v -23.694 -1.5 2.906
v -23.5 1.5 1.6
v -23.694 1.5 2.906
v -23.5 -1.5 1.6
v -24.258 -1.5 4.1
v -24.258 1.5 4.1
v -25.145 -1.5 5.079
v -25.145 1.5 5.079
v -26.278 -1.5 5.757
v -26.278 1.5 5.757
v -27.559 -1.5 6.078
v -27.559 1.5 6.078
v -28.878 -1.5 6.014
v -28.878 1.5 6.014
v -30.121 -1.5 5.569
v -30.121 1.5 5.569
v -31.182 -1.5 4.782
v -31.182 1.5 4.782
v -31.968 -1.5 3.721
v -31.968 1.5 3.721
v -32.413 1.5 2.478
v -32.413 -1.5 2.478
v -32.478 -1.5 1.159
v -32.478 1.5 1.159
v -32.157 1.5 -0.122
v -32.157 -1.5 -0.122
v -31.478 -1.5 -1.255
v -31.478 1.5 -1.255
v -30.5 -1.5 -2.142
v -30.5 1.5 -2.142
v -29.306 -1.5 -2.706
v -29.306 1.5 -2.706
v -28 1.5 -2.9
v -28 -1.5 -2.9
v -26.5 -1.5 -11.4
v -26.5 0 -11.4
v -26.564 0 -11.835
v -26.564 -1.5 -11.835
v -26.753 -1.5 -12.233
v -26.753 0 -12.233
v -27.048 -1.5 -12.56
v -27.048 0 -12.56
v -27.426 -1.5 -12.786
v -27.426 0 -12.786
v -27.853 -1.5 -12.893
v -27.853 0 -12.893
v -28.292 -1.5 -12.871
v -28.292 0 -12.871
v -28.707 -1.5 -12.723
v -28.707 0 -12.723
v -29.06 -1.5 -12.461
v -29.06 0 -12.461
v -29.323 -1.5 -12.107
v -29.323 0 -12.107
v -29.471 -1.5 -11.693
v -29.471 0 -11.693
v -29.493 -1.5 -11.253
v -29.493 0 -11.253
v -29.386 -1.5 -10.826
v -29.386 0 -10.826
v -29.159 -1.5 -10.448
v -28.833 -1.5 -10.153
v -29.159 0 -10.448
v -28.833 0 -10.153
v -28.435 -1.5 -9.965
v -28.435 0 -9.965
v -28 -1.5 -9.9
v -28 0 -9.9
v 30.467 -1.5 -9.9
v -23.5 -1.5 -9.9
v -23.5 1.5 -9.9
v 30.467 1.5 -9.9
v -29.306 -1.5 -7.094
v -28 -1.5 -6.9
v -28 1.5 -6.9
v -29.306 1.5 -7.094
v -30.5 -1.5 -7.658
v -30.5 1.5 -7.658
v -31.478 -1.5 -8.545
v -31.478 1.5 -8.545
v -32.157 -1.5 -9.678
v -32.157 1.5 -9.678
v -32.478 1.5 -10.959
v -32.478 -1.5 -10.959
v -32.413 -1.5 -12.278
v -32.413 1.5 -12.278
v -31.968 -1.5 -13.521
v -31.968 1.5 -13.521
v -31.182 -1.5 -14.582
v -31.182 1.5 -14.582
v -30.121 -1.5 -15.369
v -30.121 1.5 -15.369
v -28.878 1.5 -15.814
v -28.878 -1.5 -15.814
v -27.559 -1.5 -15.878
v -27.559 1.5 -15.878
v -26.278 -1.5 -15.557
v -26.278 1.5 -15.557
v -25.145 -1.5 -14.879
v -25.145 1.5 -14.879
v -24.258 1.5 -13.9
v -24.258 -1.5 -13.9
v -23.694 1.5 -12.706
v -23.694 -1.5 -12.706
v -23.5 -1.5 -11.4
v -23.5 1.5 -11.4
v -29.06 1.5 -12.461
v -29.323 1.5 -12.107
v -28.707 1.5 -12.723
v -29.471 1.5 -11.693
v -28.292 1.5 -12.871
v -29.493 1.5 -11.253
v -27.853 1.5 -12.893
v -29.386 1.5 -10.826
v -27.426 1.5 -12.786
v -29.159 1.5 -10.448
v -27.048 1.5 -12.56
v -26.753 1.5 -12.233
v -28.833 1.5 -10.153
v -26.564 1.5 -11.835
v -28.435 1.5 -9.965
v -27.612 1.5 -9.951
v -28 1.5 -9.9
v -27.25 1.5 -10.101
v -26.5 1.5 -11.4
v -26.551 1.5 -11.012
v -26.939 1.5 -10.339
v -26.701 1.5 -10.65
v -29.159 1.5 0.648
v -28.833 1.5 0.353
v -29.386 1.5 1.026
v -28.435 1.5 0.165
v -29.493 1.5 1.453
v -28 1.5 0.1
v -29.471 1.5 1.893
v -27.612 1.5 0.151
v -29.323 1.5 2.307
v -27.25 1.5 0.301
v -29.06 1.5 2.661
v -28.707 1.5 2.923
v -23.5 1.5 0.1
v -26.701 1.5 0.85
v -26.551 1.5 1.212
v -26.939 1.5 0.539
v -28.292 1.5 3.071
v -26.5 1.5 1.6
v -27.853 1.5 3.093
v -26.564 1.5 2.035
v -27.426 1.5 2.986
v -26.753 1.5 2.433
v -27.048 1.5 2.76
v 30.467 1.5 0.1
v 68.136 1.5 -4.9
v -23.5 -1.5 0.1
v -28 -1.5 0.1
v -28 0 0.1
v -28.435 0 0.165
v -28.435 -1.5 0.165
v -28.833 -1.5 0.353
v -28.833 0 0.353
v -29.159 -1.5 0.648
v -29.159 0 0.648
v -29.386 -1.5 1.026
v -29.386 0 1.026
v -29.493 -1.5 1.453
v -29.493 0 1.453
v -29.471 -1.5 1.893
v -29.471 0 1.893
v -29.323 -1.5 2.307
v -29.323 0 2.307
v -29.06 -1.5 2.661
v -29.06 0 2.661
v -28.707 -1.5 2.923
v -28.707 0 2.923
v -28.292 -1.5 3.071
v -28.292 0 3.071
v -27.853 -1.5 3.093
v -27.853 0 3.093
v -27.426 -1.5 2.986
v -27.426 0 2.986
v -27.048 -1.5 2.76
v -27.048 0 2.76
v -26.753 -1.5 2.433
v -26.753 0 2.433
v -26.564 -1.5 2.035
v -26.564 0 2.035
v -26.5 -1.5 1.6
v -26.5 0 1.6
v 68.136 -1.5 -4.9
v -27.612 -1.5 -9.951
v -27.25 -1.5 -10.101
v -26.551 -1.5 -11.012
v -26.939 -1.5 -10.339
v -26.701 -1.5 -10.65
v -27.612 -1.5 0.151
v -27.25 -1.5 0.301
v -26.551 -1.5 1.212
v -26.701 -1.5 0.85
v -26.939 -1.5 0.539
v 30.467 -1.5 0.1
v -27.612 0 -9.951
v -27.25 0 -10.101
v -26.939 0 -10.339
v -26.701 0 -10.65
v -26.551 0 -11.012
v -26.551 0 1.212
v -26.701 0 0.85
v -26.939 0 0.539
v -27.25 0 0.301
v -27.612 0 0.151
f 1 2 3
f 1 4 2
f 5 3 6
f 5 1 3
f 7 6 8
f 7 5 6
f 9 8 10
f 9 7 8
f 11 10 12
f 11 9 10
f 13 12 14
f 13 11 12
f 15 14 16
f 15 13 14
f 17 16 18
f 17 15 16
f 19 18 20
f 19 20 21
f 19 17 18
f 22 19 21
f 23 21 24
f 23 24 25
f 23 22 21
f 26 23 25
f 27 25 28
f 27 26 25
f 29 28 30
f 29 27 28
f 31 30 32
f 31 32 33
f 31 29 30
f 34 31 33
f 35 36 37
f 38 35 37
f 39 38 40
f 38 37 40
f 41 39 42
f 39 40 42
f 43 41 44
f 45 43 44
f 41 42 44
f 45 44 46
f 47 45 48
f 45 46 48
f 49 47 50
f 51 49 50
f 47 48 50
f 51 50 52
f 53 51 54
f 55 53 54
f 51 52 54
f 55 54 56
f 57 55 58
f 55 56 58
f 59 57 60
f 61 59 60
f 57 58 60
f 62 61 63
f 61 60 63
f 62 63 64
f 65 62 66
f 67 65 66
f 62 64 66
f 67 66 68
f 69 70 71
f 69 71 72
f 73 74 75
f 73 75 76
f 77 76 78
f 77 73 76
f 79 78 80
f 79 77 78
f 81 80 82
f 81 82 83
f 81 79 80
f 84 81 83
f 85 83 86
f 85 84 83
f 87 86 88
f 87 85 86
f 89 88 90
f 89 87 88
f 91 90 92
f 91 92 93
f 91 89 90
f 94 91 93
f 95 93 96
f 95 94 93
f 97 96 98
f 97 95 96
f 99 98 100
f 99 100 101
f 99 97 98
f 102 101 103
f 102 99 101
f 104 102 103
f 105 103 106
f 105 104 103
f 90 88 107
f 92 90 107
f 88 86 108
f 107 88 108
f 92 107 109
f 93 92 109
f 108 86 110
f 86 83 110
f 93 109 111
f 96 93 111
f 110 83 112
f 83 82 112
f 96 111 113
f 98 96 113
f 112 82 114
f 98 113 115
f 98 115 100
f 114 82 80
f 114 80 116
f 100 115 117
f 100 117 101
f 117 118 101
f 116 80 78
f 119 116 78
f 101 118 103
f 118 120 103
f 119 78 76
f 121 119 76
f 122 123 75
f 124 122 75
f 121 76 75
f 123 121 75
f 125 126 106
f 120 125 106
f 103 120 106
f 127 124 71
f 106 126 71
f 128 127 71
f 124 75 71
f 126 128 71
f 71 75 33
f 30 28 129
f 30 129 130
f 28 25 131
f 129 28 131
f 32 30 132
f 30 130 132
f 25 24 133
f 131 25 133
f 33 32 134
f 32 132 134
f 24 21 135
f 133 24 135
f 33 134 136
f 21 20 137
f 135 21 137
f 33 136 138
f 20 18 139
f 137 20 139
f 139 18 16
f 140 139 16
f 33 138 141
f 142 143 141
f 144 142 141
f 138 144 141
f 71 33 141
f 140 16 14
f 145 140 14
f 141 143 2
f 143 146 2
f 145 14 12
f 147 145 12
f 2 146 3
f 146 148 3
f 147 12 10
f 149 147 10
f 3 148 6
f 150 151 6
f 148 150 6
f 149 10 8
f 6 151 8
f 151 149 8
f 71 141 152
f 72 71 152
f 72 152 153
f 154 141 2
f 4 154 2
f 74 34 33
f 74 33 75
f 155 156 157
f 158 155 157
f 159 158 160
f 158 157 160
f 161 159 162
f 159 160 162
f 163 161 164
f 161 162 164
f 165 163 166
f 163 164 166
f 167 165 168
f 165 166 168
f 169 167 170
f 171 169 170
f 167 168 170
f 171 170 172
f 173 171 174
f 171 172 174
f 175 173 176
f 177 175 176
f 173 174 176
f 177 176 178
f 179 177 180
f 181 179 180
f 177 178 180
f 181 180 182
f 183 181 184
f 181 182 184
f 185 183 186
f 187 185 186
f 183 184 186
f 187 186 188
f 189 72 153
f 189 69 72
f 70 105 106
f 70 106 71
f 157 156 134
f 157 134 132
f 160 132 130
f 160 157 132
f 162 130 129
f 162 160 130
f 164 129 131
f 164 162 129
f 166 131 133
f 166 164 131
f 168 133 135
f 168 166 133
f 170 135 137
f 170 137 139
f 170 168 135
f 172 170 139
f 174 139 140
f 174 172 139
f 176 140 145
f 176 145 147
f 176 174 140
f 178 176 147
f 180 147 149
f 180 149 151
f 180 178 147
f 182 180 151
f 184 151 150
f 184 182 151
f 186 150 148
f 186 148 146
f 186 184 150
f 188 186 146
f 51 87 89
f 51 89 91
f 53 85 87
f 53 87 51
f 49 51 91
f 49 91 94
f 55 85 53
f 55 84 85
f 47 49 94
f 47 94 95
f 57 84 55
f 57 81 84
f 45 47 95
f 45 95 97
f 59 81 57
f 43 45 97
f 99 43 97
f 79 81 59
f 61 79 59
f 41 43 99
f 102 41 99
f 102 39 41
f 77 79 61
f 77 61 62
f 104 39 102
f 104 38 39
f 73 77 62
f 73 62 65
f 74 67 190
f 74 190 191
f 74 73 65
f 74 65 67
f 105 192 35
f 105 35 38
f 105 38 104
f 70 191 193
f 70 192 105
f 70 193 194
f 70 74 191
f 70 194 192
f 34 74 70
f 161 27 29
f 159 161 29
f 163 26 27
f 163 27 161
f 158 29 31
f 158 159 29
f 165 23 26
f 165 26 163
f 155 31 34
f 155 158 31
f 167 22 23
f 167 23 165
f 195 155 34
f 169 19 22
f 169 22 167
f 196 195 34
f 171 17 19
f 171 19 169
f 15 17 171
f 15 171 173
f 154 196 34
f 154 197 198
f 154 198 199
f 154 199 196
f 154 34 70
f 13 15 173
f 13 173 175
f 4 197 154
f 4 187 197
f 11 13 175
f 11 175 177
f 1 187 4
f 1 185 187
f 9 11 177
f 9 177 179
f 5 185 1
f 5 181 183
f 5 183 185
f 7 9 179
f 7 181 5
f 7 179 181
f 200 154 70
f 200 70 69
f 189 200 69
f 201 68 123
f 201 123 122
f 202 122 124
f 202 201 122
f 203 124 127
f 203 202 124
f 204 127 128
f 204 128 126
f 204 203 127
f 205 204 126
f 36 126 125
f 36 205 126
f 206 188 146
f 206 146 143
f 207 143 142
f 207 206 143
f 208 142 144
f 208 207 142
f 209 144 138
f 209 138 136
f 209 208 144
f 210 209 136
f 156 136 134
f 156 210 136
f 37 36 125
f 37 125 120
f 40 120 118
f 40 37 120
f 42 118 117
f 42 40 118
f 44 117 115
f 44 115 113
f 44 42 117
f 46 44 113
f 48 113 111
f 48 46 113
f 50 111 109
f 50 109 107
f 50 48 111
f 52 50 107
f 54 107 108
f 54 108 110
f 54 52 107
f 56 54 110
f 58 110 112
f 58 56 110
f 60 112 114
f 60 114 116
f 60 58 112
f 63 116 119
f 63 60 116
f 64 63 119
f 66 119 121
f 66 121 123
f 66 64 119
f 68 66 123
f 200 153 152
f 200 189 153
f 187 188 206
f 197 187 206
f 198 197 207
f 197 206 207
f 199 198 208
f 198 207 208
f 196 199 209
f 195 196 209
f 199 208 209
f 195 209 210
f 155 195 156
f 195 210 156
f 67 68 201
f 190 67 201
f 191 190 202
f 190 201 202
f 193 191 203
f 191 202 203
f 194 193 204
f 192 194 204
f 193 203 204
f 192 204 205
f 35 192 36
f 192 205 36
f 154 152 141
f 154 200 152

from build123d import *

# Parameters (mm, degrees)
F1_DEPTH = 1.5


with BuildPart() as f1:
    # F0 (on Front) → F1 (new body, symmetric)
    with BuildSketch(Plane.XZ):
        with BuildLine():
            ThreePointArc((-23.4997773468, 1.5999988765), (-31.1817578622, 4.7819793918), (-27.9997773468, -2.9000011235))
            ThreePointArc((-27.9997773468, -2.9000011235), (-24.8177968315, -1.5819816389), (-23.4997773468, 1.5999988765))
        make_face()
        with BuildLine():
            ThreePointArc((-27.9997773468, 0.0999988765), (-29.0604375186, 2.6606590482), (-26.4997773468, 1.5999988765))
            ThreePointArc((-26.4997773468, 1.5999988765), (-26.9391171751, 0.5393387047), (-27.9997773468, 0.0999988765))
        make_face(mode=Mode.SUBTRACT)
        with BuildLine():
            ThreePointArc((-23.4997773468, 1.5999988765), (-24.8177968315, -1.5819816389), (-27.9997773468, -2.9000011235))
            Line((-27.9997773468, -2.9000011235), (-27.9997773468, -4.9000011235))
            Line((-27.9997773468, -4.9000011235), (-27.9997773468, -6.9000011235))
            ThreePointArc((-27.9997773468, -6.9000011235), (-24.8177968315, -8.2180206082), (-23.4997773468, -11.4000011235))
            Line((-23.4997773468, -11.4000011235), (-23.4997773468, -9.9000011235))
            Line((-23.4997773468, -9.9000011235), (-23.4997773468, -4.9000011235))
            Line((-23.4997773468, -4.9000011235), (-23.4997773468, 0.0999988765))
            Line((-23.4997773468, 0.0999988765), (-23.4997773468, 1.5999988765))
        make_face()
        Polygon((30.4666368291, 0.0999988765), (-23.4997773468, 0.0999988765), (-23.4997773468, -4.9000011235), (-23.4997773468, -9.9000011235), (30.4666368291, -9.9000011235), (68.1362532328, -4.9000011235), align=None)
        with BuildLine():
            ThreePointArc((-23.4997773468, -11.4000011235), (-24.8177968315, -8.2180206082), (-27.9997773468, -6.9000011235))
            ThreePointArc((-27.9997773468, -6.9000011235), (-31.1817578622, -14.5819816389), (-23.4997773468, -11.4000011235))
        make_face()
        with BuildLine():
            ThreePointArc((-26.4997773468, -11.4000011235), (-29.0604375186, -12.4606612953), (-27.9997773468, -9.9000011235))
            ThreePointArc((-27.9997773468, -9.9000011235), (-26.9391171751, -10.3393409518), (-26.4997773468, -11.4000011235))
        make_face(mode=Mode.SUBTRACT)
    extrude(amount=F1_DEPTH, both=True)


solid = f1.part
